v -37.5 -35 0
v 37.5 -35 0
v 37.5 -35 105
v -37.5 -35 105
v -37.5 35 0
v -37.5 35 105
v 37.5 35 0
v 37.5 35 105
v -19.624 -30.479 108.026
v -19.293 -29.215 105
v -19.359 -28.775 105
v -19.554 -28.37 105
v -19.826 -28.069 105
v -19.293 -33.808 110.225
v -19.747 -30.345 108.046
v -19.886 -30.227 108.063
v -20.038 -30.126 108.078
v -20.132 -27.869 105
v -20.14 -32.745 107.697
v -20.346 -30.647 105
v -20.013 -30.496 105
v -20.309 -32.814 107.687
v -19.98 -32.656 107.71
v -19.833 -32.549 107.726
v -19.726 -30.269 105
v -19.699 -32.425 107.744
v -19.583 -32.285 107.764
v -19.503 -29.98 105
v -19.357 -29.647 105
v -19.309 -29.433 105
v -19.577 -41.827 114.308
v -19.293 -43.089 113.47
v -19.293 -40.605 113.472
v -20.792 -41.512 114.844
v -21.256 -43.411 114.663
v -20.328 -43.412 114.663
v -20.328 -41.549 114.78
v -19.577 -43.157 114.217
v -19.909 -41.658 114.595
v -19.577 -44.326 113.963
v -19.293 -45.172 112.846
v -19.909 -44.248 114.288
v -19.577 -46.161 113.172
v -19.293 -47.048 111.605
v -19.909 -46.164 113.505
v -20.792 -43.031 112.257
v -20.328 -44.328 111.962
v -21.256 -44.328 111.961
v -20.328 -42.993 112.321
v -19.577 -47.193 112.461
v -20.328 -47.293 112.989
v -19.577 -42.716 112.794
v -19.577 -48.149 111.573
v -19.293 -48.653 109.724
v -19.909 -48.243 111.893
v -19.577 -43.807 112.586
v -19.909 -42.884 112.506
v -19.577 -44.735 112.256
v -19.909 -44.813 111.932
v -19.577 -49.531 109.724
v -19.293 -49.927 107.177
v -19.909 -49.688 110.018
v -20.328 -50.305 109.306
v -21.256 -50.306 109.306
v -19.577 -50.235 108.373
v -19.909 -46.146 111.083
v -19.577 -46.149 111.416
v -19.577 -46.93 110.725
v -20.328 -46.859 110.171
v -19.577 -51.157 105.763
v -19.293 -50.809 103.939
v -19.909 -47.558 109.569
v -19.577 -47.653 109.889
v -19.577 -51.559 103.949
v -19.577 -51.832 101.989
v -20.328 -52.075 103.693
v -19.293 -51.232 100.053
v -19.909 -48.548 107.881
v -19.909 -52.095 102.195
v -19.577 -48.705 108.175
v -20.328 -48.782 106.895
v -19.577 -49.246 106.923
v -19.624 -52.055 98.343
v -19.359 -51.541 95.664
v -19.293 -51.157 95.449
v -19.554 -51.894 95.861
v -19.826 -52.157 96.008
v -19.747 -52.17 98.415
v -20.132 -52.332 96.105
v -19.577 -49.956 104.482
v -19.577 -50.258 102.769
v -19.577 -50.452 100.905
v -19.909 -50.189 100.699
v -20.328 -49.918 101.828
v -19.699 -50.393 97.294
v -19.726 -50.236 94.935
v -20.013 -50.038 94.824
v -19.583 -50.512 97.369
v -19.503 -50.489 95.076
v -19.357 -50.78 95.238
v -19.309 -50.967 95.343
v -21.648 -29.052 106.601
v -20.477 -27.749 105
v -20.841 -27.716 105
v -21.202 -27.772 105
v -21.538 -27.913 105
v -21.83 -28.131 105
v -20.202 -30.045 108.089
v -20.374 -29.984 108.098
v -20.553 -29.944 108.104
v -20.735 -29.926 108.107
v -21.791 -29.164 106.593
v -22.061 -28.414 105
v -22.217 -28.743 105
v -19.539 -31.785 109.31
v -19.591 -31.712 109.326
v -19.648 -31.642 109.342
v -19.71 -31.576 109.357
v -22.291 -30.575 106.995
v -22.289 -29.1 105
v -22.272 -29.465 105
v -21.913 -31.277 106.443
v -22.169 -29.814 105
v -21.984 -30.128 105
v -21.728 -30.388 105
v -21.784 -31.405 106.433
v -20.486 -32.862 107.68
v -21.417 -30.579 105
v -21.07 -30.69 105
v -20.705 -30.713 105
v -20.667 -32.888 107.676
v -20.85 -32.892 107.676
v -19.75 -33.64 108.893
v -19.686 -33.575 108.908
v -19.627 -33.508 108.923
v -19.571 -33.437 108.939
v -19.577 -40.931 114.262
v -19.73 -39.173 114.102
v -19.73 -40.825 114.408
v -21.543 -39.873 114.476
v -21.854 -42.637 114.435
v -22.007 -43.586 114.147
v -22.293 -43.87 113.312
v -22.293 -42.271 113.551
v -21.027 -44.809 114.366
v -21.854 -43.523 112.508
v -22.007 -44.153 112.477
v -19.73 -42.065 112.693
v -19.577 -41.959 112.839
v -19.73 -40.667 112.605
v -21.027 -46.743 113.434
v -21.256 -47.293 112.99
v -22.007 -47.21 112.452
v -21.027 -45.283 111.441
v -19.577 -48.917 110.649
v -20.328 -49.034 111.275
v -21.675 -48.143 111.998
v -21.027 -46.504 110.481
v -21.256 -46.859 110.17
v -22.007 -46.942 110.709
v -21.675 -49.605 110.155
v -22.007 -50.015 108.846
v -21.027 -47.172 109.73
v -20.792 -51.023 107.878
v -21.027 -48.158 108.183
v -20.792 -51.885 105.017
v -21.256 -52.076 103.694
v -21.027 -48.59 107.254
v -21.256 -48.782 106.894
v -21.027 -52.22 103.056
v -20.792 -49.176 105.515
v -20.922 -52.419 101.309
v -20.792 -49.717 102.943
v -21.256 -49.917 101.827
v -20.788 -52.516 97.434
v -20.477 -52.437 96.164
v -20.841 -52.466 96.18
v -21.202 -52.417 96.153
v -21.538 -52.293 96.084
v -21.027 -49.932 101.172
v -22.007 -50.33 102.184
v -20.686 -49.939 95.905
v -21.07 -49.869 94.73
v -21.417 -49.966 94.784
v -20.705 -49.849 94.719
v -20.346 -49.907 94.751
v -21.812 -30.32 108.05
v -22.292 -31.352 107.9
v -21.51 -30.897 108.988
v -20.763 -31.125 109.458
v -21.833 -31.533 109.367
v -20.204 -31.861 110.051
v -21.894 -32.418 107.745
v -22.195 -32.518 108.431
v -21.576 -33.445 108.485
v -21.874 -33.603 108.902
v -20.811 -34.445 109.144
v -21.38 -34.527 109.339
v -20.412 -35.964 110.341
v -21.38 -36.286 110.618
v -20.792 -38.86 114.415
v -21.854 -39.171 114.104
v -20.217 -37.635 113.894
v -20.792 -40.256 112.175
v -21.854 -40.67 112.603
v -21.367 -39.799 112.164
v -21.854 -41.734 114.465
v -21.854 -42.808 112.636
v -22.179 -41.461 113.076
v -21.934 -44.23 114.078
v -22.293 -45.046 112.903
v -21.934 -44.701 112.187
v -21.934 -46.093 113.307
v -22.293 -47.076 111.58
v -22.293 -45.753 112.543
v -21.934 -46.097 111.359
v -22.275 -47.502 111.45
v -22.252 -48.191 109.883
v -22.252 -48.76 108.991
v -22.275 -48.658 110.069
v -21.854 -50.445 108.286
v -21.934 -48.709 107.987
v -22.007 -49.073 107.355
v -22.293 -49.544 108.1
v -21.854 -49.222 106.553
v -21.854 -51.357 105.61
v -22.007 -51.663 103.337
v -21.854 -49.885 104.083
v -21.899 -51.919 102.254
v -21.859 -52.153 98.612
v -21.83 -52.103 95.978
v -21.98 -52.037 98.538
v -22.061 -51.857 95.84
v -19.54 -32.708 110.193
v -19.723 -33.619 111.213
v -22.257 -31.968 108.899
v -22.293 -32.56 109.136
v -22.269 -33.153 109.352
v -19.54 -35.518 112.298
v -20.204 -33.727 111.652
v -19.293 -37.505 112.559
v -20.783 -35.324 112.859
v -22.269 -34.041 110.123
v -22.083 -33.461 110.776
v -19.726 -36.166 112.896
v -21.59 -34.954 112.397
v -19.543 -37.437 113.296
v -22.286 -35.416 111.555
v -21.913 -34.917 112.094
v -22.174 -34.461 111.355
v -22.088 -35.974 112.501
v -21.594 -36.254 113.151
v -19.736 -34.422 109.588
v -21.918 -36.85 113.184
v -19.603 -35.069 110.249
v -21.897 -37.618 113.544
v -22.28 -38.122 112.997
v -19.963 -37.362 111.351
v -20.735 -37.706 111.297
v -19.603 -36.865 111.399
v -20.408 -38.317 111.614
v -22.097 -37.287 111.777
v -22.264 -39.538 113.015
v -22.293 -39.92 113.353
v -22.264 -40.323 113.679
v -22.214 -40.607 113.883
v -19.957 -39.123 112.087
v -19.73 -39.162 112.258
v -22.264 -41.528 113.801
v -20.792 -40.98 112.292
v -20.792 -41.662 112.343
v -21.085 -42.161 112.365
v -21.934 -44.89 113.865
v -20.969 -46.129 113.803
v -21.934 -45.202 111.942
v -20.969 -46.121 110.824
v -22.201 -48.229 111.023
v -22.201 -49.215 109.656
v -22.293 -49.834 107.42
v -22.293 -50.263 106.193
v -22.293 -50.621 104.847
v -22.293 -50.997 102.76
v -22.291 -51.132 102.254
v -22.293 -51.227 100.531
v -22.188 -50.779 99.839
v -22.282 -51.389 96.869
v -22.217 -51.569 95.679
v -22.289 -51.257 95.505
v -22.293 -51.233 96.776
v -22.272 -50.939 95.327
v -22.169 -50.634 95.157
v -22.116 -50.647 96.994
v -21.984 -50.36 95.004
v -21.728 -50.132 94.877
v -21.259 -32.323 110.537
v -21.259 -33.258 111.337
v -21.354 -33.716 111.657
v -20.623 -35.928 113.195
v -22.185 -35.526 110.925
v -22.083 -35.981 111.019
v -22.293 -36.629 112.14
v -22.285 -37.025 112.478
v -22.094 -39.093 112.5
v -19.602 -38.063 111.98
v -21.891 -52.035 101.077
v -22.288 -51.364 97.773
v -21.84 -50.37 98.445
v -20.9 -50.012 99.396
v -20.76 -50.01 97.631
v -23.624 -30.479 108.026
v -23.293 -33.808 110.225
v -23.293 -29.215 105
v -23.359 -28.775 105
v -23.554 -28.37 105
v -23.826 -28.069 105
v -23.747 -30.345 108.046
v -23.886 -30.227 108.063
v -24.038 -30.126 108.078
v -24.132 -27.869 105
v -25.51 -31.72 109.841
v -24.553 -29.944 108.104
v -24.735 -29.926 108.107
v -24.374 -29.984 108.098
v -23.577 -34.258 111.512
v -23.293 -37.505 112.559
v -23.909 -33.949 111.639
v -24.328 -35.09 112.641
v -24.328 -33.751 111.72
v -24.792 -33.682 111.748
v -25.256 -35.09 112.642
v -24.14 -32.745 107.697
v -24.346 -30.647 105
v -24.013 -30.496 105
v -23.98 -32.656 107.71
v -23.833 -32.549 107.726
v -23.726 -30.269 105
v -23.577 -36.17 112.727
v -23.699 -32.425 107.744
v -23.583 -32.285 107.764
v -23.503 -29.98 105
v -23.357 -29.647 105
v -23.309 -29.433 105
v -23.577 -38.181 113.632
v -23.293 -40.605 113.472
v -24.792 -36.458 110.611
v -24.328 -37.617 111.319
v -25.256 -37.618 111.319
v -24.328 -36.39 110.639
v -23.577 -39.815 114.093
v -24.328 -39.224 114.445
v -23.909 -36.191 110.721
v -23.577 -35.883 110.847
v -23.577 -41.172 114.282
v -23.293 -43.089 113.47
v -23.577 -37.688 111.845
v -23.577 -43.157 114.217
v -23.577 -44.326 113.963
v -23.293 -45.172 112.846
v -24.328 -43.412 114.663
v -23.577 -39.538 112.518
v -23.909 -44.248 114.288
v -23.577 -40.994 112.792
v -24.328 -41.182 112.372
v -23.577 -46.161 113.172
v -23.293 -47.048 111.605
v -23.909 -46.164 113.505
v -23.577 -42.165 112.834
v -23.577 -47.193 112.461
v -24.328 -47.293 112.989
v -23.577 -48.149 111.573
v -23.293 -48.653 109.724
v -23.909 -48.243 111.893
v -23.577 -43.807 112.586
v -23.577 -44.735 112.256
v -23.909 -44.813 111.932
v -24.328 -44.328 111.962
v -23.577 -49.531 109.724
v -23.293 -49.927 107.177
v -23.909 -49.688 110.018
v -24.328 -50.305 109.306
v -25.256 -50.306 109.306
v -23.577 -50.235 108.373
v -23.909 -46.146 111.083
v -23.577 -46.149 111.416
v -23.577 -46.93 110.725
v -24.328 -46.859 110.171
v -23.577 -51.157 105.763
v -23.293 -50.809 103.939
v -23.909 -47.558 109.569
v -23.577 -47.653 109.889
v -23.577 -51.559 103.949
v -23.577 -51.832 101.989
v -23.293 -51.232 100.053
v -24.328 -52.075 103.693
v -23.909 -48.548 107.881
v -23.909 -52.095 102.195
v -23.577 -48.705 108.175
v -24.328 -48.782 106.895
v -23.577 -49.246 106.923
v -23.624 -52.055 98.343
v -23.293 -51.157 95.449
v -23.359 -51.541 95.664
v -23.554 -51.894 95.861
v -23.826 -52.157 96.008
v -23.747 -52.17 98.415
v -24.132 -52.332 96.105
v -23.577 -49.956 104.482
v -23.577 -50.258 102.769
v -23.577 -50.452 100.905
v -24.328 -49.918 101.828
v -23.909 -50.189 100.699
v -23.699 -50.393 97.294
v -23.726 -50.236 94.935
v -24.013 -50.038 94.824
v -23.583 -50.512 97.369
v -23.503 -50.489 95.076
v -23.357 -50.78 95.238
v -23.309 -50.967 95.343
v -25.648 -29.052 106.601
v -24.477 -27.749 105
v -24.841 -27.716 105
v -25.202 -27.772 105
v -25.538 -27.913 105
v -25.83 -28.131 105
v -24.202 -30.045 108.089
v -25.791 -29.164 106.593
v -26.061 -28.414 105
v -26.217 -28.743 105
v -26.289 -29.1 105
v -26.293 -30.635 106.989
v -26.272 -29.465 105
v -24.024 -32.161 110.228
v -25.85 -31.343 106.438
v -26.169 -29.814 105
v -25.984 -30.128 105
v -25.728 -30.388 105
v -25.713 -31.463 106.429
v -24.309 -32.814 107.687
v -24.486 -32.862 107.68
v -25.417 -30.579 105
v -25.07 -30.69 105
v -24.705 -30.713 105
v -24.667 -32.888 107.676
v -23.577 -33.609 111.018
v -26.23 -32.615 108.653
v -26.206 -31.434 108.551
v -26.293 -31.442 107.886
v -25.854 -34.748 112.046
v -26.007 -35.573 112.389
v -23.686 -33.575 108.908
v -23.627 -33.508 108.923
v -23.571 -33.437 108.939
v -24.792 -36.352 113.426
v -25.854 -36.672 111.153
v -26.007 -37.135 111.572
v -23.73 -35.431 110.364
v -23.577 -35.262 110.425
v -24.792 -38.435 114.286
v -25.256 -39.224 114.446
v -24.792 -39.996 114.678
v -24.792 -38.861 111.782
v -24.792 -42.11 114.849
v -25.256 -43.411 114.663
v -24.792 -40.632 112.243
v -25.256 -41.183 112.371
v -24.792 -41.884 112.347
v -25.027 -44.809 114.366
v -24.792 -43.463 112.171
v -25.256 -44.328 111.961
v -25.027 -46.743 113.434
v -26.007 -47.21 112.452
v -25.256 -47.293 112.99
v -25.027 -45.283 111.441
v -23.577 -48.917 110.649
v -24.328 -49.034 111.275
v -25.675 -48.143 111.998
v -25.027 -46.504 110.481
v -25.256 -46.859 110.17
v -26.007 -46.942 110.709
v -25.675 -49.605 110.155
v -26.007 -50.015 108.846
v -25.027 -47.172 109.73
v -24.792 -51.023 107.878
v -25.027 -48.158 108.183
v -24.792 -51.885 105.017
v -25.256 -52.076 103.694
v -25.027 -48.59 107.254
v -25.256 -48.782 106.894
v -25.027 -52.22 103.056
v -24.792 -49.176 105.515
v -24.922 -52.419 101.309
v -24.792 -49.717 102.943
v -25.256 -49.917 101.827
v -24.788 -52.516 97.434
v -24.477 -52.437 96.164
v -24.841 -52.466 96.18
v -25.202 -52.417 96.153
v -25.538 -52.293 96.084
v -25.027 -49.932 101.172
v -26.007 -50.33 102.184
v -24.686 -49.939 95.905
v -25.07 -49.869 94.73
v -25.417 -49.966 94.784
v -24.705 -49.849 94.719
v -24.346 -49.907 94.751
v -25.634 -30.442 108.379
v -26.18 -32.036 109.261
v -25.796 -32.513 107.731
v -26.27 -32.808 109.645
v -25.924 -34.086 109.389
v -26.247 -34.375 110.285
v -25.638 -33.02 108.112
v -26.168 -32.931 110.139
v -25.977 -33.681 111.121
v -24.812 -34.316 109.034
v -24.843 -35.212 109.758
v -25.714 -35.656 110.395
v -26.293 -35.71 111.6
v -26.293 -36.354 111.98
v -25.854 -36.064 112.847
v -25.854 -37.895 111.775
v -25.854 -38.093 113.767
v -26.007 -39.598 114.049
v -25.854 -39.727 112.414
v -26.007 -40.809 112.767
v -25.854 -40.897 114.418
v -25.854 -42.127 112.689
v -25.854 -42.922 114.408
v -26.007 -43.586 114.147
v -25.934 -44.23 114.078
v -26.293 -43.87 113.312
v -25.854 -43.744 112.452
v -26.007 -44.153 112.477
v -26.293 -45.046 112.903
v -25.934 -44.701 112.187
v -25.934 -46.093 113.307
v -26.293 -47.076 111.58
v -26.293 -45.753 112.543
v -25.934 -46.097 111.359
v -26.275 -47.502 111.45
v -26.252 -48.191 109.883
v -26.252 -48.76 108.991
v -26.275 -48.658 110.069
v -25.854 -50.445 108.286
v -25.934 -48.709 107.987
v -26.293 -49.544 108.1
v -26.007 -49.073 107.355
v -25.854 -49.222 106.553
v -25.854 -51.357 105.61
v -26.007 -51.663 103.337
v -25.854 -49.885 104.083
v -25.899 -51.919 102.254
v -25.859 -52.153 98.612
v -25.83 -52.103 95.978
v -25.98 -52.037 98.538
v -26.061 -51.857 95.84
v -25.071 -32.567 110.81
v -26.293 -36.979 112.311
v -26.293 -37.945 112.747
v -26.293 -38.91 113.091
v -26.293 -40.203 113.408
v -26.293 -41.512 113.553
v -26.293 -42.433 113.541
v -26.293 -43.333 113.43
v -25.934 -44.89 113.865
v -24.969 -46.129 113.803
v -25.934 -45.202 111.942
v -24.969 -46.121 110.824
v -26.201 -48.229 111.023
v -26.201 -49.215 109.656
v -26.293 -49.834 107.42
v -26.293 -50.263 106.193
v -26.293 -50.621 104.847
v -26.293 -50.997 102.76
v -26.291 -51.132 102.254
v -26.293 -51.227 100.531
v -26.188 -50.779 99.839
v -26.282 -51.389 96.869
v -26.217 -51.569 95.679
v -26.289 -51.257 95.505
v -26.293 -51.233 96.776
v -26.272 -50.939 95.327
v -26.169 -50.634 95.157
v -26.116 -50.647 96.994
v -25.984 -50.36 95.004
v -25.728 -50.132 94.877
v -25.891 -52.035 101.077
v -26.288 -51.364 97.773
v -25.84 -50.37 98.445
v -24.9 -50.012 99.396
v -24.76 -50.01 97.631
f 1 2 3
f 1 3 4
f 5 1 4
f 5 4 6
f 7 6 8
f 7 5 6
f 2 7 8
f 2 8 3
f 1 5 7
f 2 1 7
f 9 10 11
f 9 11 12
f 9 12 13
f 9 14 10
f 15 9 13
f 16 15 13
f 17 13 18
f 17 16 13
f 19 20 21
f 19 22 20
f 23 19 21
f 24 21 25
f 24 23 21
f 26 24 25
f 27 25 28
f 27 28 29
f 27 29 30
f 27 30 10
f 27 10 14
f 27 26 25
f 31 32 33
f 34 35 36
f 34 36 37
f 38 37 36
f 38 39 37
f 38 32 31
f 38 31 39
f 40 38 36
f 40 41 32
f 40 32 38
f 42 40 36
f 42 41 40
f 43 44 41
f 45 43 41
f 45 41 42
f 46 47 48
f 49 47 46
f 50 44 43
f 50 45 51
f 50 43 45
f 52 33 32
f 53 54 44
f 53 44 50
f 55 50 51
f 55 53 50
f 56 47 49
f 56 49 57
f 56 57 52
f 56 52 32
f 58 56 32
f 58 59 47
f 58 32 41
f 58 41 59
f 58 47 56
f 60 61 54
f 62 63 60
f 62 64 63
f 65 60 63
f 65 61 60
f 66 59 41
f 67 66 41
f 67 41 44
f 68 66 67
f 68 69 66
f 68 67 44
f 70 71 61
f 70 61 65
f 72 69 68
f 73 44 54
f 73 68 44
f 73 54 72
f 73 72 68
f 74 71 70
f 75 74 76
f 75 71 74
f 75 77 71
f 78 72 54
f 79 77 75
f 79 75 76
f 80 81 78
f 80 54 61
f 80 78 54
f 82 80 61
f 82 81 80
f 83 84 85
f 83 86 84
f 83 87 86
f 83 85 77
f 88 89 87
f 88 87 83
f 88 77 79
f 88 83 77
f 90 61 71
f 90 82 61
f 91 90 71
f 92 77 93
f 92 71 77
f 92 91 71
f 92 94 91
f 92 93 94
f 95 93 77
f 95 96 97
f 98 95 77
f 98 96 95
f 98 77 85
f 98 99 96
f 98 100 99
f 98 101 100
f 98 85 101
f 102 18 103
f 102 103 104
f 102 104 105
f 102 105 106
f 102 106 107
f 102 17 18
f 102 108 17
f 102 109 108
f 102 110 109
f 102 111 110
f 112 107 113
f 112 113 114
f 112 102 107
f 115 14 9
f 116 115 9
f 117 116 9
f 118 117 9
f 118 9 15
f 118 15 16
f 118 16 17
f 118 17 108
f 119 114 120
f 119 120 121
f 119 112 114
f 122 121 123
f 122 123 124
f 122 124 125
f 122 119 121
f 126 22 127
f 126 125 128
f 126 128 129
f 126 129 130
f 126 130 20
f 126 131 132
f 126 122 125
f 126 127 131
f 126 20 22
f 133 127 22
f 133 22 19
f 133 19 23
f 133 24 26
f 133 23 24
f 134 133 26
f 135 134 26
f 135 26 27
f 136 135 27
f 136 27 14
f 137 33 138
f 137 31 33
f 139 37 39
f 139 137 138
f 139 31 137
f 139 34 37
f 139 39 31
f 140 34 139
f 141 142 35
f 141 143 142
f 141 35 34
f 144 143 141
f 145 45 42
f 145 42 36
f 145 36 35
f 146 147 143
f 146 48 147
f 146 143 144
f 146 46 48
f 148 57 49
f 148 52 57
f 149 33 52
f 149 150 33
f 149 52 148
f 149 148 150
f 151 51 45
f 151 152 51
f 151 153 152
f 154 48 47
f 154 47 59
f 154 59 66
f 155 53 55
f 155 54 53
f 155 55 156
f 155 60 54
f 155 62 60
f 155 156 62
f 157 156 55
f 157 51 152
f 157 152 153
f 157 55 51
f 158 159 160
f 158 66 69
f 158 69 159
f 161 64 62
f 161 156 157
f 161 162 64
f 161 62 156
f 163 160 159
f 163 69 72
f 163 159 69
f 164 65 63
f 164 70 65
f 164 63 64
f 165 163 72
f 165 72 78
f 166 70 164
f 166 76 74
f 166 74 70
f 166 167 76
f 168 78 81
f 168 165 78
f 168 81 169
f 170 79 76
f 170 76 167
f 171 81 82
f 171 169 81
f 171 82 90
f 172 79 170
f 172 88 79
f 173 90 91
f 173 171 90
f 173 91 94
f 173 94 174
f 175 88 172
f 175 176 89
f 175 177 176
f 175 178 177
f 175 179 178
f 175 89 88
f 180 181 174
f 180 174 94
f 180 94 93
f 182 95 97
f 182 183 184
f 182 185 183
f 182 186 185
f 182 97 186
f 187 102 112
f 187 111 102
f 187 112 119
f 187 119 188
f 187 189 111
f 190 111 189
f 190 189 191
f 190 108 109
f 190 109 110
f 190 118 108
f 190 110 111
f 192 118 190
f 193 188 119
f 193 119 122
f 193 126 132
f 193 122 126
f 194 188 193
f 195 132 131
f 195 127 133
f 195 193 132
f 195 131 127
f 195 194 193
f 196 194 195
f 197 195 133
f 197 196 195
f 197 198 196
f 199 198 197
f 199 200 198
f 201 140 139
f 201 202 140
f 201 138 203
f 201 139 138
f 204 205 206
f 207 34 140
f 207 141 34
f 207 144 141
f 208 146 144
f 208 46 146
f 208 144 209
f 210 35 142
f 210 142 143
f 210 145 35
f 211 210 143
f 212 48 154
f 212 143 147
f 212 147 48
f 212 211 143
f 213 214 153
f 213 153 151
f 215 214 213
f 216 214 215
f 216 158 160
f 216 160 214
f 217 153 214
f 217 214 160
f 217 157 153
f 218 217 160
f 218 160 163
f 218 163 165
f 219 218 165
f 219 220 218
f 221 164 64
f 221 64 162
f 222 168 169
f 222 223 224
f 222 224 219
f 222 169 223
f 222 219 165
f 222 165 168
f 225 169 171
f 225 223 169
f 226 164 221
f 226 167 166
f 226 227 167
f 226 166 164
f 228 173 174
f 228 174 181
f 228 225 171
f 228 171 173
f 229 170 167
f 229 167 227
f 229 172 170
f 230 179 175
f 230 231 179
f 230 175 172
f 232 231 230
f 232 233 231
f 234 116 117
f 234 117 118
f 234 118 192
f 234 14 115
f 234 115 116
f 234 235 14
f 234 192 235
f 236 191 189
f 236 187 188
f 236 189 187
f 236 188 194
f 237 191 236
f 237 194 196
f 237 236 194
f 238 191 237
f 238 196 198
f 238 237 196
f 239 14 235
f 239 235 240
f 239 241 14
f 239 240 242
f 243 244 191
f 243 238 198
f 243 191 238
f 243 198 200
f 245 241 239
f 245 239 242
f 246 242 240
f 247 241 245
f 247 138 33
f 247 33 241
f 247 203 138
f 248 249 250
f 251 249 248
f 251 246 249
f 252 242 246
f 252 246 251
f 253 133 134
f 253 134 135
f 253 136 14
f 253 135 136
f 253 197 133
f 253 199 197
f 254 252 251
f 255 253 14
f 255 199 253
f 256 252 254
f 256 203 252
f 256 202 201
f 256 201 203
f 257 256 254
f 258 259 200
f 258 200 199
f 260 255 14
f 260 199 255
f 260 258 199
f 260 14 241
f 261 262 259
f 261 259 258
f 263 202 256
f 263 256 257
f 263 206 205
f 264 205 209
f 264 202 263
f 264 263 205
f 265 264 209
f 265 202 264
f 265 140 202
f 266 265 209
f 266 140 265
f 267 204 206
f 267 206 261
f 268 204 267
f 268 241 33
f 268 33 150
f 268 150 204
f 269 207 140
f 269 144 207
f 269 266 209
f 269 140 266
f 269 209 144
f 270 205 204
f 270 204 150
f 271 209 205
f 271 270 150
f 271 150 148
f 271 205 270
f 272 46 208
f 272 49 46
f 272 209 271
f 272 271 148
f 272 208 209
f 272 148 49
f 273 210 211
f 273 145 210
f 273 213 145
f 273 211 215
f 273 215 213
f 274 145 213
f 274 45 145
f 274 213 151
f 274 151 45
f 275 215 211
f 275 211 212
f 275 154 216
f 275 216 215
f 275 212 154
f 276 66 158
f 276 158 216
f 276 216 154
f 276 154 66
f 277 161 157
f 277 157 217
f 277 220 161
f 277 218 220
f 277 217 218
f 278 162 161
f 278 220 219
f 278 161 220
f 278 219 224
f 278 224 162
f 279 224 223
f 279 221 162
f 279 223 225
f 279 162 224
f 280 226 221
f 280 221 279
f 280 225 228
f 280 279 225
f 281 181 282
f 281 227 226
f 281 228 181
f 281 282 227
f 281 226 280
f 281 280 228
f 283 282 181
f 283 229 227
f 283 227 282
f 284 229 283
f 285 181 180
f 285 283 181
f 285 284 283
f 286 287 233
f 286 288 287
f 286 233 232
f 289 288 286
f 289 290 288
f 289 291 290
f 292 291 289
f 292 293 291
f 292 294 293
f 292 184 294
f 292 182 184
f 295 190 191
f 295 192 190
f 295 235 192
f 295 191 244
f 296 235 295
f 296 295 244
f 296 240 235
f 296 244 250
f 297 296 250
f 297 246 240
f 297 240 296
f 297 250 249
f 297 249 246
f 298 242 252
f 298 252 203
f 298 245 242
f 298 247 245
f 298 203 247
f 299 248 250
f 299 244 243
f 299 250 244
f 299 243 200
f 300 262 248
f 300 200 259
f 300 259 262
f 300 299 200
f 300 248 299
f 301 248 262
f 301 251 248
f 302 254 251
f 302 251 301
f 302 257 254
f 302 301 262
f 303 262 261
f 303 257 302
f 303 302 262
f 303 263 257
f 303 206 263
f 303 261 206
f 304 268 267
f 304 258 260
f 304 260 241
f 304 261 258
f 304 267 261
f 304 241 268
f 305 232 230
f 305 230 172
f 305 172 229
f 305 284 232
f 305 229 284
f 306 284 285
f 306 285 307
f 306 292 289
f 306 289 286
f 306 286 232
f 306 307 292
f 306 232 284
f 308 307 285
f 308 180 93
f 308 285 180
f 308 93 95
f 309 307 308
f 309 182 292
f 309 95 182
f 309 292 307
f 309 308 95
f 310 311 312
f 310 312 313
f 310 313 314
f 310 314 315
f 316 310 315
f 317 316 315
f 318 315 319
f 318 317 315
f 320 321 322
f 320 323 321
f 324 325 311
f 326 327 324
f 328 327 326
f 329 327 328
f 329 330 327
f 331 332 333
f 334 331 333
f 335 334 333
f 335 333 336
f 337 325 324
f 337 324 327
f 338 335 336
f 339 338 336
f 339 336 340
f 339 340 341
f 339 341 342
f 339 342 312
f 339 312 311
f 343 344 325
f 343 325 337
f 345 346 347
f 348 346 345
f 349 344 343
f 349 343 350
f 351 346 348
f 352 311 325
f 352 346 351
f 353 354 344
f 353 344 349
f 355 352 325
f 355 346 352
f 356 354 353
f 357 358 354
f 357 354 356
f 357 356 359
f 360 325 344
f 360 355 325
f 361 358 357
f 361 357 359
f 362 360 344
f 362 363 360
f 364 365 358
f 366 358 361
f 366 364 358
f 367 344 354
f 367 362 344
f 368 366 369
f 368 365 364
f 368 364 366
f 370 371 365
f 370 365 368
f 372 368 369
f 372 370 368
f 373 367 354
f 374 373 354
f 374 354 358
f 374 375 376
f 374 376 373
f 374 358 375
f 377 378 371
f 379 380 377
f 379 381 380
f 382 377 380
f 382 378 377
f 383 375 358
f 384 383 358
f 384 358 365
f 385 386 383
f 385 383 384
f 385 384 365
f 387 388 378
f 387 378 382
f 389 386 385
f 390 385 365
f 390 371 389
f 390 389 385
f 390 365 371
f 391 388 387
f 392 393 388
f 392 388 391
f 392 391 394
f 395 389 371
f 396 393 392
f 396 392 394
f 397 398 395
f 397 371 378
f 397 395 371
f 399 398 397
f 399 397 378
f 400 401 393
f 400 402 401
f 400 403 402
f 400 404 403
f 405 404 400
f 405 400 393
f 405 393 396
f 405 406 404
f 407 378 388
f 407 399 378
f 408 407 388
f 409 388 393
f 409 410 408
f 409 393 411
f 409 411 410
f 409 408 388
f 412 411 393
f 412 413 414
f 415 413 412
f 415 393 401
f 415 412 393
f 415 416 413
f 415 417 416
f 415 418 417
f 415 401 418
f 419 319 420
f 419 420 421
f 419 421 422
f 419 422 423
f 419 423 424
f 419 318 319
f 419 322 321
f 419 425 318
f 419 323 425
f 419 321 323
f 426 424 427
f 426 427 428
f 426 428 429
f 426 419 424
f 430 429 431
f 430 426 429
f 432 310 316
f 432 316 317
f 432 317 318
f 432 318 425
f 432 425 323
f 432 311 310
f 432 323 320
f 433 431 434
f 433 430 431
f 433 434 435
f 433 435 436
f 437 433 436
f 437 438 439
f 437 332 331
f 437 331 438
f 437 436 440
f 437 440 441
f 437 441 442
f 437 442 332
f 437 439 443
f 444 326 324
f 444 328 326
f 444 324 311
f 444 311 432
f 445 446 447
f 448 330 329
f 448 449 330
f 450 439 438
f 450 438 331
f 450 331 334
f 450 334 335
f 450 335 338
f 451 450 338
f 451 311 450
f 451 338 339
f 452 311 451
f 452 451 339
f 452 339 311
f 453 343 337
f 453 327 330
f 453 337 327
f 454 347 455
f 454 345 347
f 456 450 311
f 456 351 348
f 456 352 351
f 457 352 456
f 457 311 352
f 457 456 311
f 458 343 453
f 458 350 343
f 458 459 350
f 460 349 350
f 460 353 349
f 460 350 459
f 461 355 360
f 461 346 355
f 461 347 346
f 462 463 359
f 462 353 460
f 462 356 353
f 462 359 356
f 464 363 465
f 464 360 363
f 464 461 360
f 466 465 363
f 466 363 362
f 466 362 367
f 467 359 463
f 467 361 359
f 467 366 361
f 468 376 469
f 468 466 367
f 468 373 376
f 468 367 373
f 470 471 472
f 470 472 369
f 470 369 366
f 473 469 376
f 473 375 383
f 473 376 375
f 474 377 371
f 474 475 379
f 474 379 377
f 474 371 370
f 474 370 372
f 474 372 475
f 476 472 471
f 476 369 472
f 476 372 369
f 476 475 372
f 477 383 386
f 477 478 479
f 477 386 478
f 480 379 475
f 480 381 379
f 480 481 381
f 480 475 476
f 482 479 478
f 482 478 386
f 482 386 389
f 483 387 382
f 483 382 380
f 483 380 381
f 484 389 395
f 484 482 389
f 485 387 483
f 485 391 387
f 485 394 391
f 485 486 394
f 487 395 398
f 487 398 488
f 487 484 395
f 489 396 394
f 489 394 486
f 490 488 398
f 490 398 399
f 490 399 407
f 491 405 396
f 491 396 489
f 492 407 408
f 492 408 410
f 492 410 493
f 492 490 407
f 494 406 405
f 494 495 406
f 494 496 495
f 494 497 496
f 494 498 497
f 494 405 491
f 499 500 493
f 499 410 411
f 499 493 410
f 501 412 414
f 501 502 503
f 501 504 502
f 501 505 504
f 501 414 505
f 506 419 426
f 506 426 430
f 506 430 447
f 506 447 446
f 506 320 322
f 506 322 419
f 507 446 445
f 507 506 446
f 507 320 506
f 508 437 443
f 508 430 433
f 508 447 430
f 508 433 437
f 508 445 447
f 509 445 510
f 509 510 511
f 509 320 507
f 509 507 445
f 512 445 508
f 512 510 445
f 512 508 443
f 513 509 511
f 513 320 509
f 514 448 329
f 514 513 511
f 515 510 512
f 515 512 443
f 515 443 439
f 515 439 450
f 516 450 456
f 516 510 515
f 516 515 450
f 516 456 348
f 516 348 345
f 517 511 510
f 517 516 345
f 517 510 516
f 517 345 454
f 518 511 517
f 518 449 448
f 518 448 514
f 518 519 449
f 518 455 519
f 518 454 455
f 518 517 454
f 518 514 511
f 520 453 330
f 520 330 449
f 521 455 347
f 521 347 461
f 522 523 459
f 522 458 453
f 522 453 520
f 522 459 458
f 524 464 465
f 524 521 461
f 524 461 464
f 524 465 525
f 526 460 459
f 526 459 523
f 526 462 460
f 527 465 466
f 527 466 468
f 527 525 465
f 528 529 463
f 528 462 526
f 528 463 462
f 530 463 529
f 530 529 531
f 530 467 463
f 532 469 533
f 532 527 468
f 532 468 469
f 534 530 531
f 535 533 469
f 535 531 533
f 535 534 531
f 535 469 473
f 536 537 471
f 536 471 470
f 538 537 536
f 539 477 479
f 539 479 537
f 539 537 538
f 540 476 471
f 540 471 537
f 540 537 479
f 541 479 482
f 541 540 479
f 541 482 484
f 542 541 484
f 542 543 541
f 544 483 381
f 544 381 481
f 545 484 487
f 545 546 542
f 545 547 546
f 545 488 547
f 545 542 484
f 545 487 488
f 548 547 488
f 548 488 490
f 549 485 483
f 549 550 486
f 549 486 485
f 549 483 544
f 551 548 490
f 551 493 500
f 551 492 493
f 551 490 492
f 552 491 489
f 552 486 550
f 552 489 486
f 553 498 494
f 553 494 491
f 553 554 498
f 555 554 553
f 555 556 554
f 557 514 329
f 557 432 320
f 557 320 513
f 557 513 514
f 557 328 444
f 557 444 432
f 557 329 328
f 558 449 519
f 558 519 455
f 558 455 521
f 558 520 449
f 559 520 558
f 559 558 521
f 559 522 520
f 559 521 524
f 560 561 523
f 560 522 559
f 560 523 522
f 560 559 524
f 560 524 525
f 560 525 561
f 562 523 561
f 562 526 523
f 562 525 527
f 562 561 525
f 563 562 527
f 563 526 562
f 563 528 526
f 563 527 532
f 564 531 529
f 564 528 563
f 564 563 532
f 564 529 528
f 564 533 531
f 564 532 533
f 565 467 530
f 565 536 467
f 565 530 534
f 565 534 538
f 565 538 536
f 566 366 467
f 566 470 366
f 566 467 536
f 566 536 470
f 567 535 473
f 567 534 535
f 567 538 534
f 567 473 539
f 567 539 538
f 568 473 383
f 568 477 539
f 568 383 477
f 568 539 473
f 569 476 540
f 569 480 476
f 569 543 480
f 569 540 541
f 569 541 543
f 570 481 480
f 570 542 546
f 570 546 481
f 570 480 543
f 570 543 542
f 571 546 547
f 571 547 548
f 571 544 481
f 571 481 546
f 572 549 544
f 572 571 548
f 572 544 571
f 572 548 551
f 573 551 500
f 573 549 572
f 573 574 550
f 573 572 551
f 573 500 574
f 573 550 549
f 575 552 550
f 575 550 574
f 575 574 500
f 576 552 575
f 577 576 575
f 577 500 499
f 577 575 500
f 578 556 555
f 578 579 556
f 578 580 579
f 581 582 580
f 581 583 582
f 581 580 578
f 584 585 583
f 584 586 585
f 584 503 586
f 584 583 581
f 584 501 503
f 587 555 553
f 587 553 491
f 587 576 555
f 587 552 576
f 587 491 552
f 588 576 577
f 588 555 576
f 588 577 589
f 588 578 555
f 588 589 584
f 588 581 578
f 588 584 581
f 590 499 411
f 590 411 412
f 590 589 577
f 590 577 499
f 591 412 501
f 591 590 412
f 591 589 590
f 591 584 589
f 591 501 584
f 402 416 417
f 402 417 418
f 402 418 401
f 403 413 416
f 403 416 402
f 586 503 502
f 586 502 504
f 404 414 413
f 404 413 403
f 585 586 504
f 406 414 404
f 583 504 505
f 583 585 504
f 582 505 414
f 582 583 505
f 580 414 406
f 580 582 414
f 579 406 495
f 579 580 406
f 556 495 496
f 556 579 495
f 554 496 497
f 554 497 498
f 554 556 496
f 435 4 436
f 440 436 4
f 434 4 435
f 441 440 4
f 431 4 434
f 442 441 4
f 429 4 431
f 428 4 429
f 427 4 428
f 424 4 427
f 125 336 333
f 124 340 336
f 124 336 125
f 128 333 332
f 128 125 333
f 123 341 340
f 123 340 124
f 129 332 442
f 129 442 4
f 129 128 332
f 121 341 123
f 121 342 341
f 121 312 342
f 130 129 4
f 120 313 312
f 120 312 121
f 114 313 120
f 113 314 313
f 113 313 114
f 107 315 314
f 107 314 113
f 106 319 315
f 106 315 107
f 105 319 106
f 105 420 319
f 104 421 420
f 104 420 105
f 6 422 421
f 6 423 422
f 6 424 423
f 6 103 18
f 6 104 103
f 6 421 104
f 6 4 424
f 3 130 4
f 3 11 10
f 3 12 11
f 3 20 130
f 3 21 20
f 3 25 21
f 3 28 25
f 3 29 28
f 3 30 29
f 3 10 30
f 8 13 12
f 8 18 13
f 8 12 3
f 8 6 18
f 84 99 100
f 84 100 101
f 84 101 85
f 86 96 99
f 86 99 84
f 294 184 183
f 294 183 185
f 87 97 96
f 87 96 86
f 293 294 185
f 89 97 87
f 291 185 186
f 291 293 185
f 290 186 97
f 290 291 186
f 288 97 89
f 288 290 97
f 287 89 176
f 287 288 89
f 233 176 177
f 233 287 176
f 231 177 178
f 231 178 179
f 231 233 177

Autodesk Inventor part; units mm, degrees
ref_plane "YZ Plane" through (0, 0, 0) normal (1, 0, 0) x (0, 1, 0)
ref_plane "XZ Plane" through (0, 0, 0) normal (0, 1, 0) x (-1, 0, 0)
sketch "Sketch1" plane through (0, 0, 0) normal (0, 0, 1) x (1, 0, 0)
  line L0 (-37.5, 35) -> (37.5, 35)
  line L1 (37.5, 35) -> (37.5, -35)
  line L2 (37.5, -35) -> (-37.5, -35)
  line L3 (-37.5, -35) -> (-37.5, 35)
  line L4 (-37.5, 35) -> (37.5, -35) construction
  line L5 (37.5, 35) -> (-37.5, -35) construction
  point P0 (0, 0)
  dimension "d0" = 75
  dimension "d1" = 70
extrude "Extrusion1" add sketch "Sketch1" along normal blind 105
sketch "Sketch2" plane through (0, 0, 105) normal (0, 0, 1) x (1, 0, 0)
  circle A0 centre (-24.7933, -29.2153) radius 1.5
  circle A1 centre (-20.7933, -29.2153) radius 1.5
  point P0 (0, 0)
  dimension "d4" = 3
  dimension "d5" = 3
  dimension "d6" = 4
ref_plane "Work Plane2" through (-24.7933, -29.2153, 105) normal (1, 0, 0) x (0, 1, 0)
sketch "Sketch3" plane through (-24.7933, -29.2153, 105) normal (1, 0, 0) x (0, 1, 0)
  line L0 (0, 0) -> (-8.28, 12.6748) construction
  line L1 (-8.28, 12.6748) -> (-23.4846, 12.6748) construction
  line L2 (-23.4846, 12.6748) -> (-21.9413, -9.551) construction
  spline S0 degree 3 poles (0, 0) (-8.28, 12.6748) (-23.4846, 12.6748) (-21.9413, -9.551) knots 1 1 1 1 2 2 2 2
  point P0 (29.2153, -105)
sweep "Sweep1" add profiles "Sketch2" path "Sketch3" contours A0
pattern_linear "Rectangular Pattern1" count 2 spacing 4 along (1, 0, 0) of "Sweep1"
properties part number "battery_24V"
